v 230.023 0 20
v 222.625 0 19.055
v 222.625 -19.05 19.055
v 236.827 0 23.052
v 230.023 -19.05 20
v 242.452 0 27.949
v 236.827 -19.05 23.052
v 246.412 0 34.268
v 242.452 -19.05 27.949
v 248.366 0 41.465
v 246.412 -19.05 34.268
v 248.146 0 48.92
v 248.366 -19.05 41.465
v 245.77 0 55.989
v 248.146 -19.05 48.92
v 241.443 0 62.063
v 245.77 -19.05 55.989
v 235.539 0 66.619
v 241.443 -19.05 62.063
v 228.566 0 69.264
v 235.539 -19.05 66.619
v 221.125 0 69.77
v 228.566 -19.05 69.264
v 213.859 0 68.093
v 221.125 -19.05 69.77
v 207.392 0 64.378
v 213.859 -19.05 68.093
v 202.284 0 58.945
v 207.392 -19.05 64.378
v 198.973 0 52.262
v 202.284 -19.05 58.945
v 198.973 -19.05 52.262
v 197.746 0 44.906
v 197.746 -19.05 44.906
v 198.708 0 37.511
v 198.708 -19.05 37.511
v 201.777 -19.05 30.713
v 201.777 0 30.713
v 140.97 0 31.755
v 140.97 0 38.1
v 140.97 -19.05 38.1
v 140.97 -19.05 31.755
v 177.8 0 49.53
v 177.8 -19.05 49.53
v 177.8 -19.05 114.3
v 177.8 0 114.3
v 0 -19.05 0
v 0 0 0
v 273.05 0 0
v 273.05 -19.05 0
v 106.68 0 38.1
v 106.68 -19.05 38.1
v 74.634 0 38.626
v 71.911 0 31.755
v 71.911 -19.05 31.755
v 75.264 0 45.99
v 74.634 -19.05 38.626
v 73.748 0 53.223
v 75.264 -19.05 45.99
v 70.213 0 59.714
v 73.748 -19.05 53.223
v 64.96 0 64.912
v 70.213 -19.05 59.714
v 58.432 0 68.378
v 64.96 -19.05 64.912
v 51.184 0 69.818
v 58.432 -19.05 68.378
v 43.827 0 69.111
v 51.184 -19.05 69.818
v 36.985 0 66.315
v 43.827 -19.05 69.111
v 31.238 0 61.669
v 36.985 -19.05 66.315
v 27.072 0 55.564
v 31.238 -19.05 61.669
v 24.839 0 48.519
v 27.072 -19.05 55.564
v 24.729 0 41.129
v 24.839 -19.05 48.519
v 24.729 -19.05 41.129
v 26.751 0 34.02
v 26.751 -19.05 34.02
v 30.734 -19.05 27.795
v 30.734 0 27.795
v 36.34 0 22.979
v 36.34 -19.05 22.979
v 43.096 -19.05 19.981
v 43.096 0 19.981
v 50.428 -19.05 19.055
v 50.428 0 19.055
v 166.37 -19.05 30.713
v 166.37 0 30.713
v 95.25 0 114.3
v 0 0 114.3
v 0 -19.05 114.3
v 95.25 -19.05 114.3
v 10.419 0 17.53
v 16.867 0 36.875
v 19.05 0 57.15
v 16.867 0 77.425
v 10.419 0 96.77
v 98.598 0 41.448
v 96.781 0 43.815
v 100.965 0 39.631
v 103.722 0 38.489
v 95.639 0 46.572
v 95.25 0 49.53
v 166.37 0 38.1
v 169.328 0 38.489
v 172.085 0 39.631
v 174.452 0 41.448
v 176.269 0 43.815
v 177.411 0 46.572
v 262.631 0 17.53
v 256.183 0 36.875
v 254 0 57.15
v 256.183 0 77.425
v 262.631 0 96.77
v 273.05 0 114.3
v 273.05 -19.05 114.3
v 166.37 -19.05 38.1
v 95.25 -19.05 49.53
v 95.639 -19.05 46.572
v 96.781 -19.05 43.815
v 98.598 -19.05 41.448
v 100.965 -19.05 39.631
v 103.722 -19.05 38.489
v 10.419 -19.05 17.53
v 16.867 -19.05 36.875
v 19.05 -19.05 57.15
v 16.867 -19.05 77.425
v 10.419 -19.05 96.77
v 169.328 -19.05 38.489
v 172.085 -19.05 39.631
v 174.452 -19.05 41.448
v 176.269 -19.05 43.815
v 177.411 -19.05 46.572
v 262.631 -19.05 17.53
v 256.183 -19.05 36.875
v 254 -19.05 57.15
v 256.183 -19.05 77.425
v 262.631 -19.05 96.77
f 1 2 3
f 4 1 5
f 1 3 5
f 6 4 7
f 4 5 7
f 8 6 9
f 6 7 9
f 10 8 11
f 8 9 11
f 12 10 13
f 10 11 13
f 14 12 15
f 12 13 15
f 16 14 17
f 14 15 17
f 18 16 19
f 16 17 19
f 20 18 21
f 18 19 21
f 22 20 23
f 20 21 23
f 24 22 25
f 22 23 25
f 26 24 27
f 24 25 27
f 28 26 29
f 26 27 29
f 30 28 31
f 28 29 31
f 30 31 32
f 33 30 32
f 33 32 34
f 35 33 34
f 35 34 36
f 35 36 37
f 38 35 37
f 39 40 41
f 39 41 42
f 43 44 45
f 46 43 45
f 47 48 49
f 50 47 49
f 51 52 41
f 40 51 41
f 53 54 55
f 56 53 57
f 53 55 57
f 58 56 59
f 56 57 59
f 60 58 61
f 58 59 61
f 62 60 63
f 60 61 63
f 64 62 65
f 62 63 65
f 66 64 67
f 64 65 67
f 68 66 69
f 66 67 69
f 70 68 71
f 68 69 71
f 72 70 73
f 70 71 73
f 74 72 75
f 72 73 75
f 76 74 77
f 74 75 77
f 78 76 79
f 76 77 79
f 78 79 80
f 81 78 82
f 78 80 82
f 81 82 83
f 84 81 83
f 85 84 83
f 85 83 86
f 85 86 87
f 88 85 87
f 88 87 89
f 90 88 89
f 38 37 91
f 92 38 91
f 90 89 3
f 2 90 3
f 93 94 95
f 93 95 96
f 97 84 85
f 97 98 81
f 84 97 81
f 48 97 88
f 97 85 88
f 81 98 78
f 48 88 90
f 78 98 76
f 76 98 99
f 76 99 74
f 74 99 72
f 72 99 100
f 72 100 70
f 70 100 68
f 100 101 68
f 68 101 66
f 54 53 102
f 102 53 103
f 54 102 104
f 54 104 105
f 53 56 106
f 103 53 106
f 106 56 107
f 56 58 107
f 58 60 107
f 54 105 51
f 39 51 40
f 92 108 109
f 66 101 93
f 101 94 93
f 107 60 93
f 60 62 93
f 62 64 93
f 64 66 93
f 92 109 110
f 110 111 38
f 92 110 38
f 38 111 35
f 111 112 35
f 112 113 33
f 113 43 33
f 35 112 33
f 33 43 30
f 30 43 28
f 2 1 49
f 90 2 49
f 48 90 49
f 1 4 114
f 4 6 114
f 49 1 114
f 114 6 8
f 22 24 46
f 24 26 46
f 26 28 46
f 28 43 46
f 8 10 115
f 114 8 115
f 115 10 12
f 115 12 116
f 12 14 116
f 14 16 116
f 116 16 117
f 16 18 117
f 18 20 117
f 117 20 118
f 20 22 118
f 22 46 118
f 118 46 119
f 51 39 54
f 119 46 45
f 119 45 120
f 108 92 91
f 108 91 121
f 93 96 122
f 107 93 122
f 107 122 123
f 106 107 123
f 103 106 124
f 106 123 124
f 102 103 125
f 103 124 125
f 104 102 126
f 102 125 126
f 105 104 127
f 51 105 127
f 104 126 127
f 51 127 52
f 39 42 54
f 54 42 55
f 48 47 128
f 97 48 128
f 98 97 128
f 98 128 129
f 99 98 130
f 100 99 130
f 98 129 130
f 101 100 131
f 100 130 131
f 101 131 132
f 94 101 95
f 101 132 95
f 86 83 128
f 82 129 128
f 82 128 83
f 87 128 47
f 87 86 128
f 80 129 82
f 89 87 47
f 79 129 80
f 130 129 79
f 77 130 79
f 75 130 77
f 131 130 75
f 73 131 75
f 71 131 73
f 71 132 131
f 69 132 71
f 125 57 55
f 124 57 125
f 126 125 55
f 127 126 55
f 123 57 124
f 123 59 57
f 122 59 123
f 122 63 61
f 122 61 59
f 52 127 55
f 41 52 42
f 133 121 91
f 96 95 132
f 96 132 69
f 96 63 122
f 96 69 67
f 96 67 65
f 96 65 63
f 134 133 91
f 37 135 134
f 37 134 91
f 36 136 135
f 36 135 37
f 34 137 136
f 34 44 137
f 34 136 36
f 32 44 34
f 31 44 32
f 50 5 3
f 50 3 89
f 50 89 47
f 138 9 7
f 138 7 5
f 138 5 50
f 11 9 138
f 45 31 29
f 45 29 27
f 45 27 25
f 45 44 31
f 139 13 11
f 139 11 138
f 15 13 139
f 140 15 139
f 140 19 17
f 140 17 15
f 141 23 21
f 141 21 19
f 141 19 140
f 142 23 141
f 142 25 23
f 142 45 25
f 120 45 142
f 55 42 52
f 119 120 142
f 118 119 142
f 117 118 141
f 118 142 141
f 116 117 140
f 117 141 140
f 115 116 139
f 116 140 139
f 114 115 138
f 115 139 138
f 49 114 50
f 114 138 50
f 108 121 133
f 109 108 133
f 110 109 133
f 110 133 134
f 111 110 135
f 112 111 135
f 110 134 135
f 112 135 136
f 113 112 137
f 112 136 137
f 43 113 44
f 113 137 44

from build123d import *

# Parameters (mm, degrees)
F0_W     = 273.05
F0_H     = 114.3
F1_DEPTH = 19.05
F3_DEPTH = 25.4
F4_R     = 25.4
F5_DEPTH = 25.4
F7_DEPTH = 25.4


with BuildPart() as f1:
    # F0 (on Front) → F1 (new body)
    with BuildSketch(Plane.XZ):
        with Locations((136.525, 57.15)):
            Rectangle(F0_W, F0_H)
    extrude(amount=F1_DEPTH)

    # F2 (on face) → F3 (cut)
    with BuildSketch(Plane.XZ.offset(19.05)):
        with BuildLine():
            Line((0, 114.3), (0, 0))
            ThreePointArc((0, 0), (19.05, 57.15), (0, 114.3))
        make_face()
        with BuildLine():
            ThreePointArc((273.05, 114.3), (254, 57.15), (273.05, 0))
            Line((273.05, 0), (273.05, 114.3))
        make_face()
    extrude(amount=-F3_DEPTH, mode=Mode.SUBTRACT)

    # F4 (on face) → F5 (cut)
    with BuildSketch(Plane.XZ.offset(19.05)):
        with BuildLine():
            Line((177.8, 114.3), (95.25, 114.3))
            Line((95.25, 114.3), (95.25, 49.53))
            ThreePointArc((95.25, 49.53), (106.68, 60.96), (118.11, 49.53))
            ThreePointArc((118.11, 49.53), (114.762230509, 41.447769491), (106.68, 38.1))
            Line((106.68, 38.1), (166.37, 38.1))
            ThreePointArc((166.37, 38.1), (158.287769491, 57.612230509), (177.8, 49.53))
            Line((177.8, 49.53), (177.8, 114.3))
        make_face()
        with Locations((49.9111476386, 44.45)):
            Circle(F4_R)
        with Locations((223.1418776763, 44.45)):
            Circle(F4_R)
        with BuildLine():
            ThreePointArc((166.37, 38.1), (174.452230509, 41.447769491), (177.8, 49.53))
            ThreePointArc((177.8, 49.53), (158.287769491, 57.612230509), (166.37, 38.1))
        make_face()
        with BuildLine():
            ThreePointArc((118.11, 49.53), (106.68, 60.96), (95.25, 49.53))
            ThreePointArc((95.25, 49.53), (98.597769491, 41.447769491), (106.68, 38.1))
            ThreePointArc((106.68, 38.1), (114.762230509, 41.447769491), (118.11, 49.53))
        make_face()
    extrude(amount=-F5_DEPTH, mode=Mode.SUBTRACT)

    # F6 (on face) → F7 (cut)
    with BuildSketch(Plane.XZ.offset(19.05)):
        with BuildLine():
            Line((166.37, 30.7134911418), (166.37, 38.1))
            Line((166.37, 38.1), (140.97, 38.1))
            Line((140.97, 38.1), (140.97, 31.755262097))
            Line((140.97, 31.755262097), (71.9112301288, 31.755262097))
            ThreePointArc((71.9112301288, 31.755262097), (62.8369832957, 22.5848960084), (50.4281455484, 19.055262097))
            Line((50.4281455484, 19.055262097), (222.6248797665, 19.055262097))
            ThreePointArc((222.6248797665, 19.055262097), (210.7448885281, 22.2807722269), (201.7767583369, 30.7134911418))
            Line((201.7767583369, 30.7134911418), (166.37, 30.7134911418))
        make_face()
    extrude(amount=-F7_DEPTH, mode=Mode.SUBTRACT)


solid = f1.part
